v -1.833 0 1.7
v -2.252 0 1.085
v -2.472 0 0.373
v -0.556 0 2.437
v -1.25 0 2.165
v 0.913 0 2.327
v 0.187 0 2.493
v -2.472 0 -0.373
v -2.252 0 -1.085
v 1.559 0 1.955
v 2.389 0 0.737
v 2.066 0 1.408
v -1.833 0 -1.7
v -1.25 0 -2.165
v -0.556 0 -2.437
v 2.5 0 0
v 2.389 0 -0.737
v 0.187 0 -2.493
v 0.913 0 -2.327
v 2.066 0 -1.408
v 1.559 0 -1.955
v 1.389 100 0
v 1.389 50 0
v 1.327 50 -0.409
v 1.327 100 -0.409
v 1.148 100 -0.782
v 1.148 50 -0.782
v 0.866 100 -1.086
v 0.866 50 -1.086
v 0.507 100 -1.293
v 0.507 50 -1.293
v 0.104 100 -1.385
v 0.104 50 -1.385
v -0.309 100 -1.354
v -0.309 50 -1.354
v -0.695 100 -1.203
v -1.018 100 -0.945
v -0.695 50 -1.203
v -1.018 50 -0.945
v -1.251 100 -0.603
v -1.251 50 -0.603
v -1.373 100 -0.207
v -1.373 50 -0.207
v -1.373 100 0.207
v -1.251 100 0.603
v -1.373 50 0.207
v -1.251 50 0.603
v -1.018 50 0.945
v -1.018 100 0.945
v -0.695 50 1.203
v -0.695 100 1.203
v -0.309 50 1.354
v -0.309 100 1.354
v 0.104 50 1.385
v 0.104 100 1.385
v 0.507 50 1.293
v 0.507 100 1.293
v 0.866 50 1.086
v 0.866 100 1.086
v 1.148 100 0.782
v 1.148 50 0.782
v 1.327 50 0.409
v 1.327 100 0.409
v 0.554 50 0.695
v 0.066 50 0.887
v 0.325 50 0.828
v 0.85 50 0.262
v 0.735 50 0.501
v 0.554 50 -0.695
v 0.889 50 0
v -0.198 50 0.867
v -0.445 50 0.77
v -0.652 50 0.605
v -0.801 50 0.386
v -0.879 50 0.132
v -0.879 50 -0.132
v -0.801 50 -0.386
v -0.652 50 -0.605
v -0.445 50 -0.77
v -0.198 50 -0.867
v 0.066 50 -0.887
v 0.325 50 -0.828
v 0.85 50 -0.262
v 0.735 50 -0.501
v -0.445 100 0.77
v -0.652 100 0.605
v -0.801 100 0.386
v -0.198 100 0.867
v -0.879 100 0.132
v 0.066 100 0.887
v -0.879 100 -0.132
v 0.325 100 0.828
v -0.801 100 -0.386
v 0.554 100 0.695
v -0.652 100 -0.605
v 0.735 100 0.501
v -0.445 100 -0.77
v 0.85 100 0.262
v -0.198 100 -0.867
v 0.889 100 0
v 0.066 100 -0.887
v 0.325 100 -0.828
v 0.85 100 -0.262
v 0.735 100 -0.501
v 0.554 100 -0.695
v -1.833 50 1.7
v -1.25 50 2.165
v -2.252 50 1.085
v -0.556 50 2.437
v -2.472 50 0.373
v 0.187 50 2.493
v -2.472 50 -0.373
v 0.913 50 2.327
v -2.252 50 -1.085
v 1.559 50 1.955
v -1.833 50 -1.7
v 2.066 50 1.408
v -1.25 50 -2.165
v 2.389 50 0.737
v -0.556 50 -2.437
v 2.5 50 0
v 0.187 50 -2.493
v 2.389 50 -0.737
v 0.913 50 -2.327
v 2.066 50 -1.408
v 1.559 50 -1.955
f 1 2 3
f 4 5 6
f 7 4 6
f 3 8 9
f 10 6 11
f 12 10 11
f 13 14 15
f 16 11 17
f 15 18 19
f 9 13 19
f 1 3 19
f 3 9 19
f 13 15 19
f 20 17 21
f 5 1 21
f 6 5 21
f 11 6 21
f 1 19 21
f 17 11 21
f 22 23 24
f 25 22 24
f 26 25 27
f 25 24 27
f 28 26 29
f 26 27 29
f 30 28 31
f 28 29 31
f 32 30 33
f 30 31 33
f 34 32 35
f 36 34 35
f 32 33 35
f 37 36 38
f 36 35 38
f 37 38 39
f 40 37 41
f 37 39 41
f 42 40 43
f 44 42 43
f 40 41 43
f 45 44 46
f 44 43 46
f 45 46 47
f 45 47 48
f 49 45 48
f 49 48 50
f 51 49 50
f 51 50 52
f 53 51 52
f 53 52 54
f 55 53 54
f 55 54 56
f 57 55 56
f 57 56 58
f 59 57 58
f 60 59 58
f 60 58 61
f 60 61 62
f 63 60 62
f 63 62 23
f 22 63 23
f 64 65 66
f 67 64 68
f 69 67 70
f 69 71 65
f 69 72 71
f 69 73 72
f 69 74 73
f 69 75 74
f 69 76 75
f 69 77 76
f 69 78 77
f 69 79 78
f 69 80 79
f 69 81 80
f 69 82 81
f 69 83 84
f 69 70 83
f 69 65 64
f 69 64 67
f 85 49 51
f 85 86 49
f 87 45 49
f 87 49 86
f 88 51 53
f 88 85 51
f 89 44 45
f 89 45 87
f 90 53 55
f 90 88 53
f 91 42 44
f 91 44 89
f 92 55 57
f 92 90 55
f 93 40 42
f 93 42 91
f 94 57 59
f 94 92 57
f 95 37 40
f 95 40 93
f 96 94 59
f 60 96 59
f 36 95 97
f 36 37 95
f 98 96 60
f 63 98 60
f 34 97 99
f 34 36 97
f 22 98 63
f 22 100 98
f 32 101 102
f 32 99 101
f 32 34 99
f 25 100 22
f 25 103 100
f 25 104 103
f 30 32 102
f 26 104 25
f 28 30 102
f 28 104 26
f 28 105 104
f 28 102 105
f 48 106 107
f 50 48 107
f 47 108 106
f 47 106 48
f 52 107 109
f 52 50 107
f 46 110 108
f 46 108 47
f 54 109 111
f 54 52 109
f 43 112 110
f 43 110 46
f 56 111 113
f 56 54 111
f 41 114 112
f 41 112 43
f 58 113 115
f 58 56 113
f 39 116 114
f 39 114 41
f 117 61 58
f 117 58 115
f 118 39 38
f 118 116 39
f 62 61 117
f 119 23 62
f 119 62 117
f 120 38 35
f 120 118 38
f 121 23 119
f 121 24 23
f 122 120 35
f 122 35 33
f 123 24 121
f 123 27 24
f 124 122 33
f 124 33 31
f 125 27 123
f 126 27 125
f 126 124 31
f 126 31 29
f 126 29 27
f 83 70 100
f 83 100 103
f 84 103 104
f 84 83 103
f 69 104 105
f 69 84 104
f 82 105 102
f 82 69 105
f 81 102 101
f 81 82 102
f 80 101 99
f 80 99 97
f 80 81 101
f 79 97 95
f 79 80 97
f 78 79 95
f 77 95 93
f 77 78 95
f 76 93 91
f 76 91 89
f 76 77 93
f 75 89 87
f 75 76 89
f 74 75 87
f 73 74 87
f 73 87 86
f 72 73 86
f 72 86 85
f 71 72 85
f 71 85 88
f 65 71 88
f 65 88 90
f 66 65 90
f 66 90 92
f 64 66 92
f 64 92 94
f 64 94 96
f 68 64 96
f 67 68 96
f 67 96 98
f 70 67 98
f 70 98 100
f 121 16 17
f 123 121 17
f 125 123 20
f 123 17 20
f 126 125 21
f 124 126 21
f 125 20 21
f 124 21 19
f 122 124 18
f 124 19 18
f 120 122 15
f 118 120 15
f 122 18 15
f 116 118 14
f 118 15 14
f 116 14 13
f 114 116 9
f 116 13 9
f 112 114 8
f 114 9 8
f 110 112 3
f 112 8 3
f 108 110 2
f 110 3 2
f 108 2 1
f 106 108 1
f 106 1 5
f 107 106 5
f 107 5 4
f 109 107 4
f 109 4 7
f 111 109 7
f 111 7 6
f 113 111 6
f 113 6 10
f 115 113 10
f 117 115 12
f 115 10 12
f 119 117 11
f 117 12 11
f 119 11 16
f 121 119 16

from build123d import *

# Parameters (mm, degrees)
SKETCH1_R           = 1.389
SKETCH1_R_2         = 0.889
BOSS_EXTRUDE1_DEPTH = 100
SKETCH2_R           = 2.5
BOSS_EXTRUDE2_DEPTH = 50


with BuildPart() as part:
    # Sketch1 → Boss-Extrude1 (new body)
    with BuildSketch(Plane(origin=(0, 0, 0), x_dir=(1, 0, 0), z_dir=(0, 1, 0))):
        Circle(SKETCH1_R)
        Circle(SKETCH1_R_2, mode=Mode.SUBTRACT)
    extrude(amount=BOSS_EXTRUDE1_DEPTH)

    # Sketch2 → Boss-Extrude2 (add)
    with BuildSketch(Plane(origin=(0, 0, 0), x_dir=(1, 0, 0), z_dir=(0, 1, 0))):
        Circle(SKETCH2_R)
    extrude(amount=BOSS_EXTRUDE2_DEPTH)


solid = part.part
